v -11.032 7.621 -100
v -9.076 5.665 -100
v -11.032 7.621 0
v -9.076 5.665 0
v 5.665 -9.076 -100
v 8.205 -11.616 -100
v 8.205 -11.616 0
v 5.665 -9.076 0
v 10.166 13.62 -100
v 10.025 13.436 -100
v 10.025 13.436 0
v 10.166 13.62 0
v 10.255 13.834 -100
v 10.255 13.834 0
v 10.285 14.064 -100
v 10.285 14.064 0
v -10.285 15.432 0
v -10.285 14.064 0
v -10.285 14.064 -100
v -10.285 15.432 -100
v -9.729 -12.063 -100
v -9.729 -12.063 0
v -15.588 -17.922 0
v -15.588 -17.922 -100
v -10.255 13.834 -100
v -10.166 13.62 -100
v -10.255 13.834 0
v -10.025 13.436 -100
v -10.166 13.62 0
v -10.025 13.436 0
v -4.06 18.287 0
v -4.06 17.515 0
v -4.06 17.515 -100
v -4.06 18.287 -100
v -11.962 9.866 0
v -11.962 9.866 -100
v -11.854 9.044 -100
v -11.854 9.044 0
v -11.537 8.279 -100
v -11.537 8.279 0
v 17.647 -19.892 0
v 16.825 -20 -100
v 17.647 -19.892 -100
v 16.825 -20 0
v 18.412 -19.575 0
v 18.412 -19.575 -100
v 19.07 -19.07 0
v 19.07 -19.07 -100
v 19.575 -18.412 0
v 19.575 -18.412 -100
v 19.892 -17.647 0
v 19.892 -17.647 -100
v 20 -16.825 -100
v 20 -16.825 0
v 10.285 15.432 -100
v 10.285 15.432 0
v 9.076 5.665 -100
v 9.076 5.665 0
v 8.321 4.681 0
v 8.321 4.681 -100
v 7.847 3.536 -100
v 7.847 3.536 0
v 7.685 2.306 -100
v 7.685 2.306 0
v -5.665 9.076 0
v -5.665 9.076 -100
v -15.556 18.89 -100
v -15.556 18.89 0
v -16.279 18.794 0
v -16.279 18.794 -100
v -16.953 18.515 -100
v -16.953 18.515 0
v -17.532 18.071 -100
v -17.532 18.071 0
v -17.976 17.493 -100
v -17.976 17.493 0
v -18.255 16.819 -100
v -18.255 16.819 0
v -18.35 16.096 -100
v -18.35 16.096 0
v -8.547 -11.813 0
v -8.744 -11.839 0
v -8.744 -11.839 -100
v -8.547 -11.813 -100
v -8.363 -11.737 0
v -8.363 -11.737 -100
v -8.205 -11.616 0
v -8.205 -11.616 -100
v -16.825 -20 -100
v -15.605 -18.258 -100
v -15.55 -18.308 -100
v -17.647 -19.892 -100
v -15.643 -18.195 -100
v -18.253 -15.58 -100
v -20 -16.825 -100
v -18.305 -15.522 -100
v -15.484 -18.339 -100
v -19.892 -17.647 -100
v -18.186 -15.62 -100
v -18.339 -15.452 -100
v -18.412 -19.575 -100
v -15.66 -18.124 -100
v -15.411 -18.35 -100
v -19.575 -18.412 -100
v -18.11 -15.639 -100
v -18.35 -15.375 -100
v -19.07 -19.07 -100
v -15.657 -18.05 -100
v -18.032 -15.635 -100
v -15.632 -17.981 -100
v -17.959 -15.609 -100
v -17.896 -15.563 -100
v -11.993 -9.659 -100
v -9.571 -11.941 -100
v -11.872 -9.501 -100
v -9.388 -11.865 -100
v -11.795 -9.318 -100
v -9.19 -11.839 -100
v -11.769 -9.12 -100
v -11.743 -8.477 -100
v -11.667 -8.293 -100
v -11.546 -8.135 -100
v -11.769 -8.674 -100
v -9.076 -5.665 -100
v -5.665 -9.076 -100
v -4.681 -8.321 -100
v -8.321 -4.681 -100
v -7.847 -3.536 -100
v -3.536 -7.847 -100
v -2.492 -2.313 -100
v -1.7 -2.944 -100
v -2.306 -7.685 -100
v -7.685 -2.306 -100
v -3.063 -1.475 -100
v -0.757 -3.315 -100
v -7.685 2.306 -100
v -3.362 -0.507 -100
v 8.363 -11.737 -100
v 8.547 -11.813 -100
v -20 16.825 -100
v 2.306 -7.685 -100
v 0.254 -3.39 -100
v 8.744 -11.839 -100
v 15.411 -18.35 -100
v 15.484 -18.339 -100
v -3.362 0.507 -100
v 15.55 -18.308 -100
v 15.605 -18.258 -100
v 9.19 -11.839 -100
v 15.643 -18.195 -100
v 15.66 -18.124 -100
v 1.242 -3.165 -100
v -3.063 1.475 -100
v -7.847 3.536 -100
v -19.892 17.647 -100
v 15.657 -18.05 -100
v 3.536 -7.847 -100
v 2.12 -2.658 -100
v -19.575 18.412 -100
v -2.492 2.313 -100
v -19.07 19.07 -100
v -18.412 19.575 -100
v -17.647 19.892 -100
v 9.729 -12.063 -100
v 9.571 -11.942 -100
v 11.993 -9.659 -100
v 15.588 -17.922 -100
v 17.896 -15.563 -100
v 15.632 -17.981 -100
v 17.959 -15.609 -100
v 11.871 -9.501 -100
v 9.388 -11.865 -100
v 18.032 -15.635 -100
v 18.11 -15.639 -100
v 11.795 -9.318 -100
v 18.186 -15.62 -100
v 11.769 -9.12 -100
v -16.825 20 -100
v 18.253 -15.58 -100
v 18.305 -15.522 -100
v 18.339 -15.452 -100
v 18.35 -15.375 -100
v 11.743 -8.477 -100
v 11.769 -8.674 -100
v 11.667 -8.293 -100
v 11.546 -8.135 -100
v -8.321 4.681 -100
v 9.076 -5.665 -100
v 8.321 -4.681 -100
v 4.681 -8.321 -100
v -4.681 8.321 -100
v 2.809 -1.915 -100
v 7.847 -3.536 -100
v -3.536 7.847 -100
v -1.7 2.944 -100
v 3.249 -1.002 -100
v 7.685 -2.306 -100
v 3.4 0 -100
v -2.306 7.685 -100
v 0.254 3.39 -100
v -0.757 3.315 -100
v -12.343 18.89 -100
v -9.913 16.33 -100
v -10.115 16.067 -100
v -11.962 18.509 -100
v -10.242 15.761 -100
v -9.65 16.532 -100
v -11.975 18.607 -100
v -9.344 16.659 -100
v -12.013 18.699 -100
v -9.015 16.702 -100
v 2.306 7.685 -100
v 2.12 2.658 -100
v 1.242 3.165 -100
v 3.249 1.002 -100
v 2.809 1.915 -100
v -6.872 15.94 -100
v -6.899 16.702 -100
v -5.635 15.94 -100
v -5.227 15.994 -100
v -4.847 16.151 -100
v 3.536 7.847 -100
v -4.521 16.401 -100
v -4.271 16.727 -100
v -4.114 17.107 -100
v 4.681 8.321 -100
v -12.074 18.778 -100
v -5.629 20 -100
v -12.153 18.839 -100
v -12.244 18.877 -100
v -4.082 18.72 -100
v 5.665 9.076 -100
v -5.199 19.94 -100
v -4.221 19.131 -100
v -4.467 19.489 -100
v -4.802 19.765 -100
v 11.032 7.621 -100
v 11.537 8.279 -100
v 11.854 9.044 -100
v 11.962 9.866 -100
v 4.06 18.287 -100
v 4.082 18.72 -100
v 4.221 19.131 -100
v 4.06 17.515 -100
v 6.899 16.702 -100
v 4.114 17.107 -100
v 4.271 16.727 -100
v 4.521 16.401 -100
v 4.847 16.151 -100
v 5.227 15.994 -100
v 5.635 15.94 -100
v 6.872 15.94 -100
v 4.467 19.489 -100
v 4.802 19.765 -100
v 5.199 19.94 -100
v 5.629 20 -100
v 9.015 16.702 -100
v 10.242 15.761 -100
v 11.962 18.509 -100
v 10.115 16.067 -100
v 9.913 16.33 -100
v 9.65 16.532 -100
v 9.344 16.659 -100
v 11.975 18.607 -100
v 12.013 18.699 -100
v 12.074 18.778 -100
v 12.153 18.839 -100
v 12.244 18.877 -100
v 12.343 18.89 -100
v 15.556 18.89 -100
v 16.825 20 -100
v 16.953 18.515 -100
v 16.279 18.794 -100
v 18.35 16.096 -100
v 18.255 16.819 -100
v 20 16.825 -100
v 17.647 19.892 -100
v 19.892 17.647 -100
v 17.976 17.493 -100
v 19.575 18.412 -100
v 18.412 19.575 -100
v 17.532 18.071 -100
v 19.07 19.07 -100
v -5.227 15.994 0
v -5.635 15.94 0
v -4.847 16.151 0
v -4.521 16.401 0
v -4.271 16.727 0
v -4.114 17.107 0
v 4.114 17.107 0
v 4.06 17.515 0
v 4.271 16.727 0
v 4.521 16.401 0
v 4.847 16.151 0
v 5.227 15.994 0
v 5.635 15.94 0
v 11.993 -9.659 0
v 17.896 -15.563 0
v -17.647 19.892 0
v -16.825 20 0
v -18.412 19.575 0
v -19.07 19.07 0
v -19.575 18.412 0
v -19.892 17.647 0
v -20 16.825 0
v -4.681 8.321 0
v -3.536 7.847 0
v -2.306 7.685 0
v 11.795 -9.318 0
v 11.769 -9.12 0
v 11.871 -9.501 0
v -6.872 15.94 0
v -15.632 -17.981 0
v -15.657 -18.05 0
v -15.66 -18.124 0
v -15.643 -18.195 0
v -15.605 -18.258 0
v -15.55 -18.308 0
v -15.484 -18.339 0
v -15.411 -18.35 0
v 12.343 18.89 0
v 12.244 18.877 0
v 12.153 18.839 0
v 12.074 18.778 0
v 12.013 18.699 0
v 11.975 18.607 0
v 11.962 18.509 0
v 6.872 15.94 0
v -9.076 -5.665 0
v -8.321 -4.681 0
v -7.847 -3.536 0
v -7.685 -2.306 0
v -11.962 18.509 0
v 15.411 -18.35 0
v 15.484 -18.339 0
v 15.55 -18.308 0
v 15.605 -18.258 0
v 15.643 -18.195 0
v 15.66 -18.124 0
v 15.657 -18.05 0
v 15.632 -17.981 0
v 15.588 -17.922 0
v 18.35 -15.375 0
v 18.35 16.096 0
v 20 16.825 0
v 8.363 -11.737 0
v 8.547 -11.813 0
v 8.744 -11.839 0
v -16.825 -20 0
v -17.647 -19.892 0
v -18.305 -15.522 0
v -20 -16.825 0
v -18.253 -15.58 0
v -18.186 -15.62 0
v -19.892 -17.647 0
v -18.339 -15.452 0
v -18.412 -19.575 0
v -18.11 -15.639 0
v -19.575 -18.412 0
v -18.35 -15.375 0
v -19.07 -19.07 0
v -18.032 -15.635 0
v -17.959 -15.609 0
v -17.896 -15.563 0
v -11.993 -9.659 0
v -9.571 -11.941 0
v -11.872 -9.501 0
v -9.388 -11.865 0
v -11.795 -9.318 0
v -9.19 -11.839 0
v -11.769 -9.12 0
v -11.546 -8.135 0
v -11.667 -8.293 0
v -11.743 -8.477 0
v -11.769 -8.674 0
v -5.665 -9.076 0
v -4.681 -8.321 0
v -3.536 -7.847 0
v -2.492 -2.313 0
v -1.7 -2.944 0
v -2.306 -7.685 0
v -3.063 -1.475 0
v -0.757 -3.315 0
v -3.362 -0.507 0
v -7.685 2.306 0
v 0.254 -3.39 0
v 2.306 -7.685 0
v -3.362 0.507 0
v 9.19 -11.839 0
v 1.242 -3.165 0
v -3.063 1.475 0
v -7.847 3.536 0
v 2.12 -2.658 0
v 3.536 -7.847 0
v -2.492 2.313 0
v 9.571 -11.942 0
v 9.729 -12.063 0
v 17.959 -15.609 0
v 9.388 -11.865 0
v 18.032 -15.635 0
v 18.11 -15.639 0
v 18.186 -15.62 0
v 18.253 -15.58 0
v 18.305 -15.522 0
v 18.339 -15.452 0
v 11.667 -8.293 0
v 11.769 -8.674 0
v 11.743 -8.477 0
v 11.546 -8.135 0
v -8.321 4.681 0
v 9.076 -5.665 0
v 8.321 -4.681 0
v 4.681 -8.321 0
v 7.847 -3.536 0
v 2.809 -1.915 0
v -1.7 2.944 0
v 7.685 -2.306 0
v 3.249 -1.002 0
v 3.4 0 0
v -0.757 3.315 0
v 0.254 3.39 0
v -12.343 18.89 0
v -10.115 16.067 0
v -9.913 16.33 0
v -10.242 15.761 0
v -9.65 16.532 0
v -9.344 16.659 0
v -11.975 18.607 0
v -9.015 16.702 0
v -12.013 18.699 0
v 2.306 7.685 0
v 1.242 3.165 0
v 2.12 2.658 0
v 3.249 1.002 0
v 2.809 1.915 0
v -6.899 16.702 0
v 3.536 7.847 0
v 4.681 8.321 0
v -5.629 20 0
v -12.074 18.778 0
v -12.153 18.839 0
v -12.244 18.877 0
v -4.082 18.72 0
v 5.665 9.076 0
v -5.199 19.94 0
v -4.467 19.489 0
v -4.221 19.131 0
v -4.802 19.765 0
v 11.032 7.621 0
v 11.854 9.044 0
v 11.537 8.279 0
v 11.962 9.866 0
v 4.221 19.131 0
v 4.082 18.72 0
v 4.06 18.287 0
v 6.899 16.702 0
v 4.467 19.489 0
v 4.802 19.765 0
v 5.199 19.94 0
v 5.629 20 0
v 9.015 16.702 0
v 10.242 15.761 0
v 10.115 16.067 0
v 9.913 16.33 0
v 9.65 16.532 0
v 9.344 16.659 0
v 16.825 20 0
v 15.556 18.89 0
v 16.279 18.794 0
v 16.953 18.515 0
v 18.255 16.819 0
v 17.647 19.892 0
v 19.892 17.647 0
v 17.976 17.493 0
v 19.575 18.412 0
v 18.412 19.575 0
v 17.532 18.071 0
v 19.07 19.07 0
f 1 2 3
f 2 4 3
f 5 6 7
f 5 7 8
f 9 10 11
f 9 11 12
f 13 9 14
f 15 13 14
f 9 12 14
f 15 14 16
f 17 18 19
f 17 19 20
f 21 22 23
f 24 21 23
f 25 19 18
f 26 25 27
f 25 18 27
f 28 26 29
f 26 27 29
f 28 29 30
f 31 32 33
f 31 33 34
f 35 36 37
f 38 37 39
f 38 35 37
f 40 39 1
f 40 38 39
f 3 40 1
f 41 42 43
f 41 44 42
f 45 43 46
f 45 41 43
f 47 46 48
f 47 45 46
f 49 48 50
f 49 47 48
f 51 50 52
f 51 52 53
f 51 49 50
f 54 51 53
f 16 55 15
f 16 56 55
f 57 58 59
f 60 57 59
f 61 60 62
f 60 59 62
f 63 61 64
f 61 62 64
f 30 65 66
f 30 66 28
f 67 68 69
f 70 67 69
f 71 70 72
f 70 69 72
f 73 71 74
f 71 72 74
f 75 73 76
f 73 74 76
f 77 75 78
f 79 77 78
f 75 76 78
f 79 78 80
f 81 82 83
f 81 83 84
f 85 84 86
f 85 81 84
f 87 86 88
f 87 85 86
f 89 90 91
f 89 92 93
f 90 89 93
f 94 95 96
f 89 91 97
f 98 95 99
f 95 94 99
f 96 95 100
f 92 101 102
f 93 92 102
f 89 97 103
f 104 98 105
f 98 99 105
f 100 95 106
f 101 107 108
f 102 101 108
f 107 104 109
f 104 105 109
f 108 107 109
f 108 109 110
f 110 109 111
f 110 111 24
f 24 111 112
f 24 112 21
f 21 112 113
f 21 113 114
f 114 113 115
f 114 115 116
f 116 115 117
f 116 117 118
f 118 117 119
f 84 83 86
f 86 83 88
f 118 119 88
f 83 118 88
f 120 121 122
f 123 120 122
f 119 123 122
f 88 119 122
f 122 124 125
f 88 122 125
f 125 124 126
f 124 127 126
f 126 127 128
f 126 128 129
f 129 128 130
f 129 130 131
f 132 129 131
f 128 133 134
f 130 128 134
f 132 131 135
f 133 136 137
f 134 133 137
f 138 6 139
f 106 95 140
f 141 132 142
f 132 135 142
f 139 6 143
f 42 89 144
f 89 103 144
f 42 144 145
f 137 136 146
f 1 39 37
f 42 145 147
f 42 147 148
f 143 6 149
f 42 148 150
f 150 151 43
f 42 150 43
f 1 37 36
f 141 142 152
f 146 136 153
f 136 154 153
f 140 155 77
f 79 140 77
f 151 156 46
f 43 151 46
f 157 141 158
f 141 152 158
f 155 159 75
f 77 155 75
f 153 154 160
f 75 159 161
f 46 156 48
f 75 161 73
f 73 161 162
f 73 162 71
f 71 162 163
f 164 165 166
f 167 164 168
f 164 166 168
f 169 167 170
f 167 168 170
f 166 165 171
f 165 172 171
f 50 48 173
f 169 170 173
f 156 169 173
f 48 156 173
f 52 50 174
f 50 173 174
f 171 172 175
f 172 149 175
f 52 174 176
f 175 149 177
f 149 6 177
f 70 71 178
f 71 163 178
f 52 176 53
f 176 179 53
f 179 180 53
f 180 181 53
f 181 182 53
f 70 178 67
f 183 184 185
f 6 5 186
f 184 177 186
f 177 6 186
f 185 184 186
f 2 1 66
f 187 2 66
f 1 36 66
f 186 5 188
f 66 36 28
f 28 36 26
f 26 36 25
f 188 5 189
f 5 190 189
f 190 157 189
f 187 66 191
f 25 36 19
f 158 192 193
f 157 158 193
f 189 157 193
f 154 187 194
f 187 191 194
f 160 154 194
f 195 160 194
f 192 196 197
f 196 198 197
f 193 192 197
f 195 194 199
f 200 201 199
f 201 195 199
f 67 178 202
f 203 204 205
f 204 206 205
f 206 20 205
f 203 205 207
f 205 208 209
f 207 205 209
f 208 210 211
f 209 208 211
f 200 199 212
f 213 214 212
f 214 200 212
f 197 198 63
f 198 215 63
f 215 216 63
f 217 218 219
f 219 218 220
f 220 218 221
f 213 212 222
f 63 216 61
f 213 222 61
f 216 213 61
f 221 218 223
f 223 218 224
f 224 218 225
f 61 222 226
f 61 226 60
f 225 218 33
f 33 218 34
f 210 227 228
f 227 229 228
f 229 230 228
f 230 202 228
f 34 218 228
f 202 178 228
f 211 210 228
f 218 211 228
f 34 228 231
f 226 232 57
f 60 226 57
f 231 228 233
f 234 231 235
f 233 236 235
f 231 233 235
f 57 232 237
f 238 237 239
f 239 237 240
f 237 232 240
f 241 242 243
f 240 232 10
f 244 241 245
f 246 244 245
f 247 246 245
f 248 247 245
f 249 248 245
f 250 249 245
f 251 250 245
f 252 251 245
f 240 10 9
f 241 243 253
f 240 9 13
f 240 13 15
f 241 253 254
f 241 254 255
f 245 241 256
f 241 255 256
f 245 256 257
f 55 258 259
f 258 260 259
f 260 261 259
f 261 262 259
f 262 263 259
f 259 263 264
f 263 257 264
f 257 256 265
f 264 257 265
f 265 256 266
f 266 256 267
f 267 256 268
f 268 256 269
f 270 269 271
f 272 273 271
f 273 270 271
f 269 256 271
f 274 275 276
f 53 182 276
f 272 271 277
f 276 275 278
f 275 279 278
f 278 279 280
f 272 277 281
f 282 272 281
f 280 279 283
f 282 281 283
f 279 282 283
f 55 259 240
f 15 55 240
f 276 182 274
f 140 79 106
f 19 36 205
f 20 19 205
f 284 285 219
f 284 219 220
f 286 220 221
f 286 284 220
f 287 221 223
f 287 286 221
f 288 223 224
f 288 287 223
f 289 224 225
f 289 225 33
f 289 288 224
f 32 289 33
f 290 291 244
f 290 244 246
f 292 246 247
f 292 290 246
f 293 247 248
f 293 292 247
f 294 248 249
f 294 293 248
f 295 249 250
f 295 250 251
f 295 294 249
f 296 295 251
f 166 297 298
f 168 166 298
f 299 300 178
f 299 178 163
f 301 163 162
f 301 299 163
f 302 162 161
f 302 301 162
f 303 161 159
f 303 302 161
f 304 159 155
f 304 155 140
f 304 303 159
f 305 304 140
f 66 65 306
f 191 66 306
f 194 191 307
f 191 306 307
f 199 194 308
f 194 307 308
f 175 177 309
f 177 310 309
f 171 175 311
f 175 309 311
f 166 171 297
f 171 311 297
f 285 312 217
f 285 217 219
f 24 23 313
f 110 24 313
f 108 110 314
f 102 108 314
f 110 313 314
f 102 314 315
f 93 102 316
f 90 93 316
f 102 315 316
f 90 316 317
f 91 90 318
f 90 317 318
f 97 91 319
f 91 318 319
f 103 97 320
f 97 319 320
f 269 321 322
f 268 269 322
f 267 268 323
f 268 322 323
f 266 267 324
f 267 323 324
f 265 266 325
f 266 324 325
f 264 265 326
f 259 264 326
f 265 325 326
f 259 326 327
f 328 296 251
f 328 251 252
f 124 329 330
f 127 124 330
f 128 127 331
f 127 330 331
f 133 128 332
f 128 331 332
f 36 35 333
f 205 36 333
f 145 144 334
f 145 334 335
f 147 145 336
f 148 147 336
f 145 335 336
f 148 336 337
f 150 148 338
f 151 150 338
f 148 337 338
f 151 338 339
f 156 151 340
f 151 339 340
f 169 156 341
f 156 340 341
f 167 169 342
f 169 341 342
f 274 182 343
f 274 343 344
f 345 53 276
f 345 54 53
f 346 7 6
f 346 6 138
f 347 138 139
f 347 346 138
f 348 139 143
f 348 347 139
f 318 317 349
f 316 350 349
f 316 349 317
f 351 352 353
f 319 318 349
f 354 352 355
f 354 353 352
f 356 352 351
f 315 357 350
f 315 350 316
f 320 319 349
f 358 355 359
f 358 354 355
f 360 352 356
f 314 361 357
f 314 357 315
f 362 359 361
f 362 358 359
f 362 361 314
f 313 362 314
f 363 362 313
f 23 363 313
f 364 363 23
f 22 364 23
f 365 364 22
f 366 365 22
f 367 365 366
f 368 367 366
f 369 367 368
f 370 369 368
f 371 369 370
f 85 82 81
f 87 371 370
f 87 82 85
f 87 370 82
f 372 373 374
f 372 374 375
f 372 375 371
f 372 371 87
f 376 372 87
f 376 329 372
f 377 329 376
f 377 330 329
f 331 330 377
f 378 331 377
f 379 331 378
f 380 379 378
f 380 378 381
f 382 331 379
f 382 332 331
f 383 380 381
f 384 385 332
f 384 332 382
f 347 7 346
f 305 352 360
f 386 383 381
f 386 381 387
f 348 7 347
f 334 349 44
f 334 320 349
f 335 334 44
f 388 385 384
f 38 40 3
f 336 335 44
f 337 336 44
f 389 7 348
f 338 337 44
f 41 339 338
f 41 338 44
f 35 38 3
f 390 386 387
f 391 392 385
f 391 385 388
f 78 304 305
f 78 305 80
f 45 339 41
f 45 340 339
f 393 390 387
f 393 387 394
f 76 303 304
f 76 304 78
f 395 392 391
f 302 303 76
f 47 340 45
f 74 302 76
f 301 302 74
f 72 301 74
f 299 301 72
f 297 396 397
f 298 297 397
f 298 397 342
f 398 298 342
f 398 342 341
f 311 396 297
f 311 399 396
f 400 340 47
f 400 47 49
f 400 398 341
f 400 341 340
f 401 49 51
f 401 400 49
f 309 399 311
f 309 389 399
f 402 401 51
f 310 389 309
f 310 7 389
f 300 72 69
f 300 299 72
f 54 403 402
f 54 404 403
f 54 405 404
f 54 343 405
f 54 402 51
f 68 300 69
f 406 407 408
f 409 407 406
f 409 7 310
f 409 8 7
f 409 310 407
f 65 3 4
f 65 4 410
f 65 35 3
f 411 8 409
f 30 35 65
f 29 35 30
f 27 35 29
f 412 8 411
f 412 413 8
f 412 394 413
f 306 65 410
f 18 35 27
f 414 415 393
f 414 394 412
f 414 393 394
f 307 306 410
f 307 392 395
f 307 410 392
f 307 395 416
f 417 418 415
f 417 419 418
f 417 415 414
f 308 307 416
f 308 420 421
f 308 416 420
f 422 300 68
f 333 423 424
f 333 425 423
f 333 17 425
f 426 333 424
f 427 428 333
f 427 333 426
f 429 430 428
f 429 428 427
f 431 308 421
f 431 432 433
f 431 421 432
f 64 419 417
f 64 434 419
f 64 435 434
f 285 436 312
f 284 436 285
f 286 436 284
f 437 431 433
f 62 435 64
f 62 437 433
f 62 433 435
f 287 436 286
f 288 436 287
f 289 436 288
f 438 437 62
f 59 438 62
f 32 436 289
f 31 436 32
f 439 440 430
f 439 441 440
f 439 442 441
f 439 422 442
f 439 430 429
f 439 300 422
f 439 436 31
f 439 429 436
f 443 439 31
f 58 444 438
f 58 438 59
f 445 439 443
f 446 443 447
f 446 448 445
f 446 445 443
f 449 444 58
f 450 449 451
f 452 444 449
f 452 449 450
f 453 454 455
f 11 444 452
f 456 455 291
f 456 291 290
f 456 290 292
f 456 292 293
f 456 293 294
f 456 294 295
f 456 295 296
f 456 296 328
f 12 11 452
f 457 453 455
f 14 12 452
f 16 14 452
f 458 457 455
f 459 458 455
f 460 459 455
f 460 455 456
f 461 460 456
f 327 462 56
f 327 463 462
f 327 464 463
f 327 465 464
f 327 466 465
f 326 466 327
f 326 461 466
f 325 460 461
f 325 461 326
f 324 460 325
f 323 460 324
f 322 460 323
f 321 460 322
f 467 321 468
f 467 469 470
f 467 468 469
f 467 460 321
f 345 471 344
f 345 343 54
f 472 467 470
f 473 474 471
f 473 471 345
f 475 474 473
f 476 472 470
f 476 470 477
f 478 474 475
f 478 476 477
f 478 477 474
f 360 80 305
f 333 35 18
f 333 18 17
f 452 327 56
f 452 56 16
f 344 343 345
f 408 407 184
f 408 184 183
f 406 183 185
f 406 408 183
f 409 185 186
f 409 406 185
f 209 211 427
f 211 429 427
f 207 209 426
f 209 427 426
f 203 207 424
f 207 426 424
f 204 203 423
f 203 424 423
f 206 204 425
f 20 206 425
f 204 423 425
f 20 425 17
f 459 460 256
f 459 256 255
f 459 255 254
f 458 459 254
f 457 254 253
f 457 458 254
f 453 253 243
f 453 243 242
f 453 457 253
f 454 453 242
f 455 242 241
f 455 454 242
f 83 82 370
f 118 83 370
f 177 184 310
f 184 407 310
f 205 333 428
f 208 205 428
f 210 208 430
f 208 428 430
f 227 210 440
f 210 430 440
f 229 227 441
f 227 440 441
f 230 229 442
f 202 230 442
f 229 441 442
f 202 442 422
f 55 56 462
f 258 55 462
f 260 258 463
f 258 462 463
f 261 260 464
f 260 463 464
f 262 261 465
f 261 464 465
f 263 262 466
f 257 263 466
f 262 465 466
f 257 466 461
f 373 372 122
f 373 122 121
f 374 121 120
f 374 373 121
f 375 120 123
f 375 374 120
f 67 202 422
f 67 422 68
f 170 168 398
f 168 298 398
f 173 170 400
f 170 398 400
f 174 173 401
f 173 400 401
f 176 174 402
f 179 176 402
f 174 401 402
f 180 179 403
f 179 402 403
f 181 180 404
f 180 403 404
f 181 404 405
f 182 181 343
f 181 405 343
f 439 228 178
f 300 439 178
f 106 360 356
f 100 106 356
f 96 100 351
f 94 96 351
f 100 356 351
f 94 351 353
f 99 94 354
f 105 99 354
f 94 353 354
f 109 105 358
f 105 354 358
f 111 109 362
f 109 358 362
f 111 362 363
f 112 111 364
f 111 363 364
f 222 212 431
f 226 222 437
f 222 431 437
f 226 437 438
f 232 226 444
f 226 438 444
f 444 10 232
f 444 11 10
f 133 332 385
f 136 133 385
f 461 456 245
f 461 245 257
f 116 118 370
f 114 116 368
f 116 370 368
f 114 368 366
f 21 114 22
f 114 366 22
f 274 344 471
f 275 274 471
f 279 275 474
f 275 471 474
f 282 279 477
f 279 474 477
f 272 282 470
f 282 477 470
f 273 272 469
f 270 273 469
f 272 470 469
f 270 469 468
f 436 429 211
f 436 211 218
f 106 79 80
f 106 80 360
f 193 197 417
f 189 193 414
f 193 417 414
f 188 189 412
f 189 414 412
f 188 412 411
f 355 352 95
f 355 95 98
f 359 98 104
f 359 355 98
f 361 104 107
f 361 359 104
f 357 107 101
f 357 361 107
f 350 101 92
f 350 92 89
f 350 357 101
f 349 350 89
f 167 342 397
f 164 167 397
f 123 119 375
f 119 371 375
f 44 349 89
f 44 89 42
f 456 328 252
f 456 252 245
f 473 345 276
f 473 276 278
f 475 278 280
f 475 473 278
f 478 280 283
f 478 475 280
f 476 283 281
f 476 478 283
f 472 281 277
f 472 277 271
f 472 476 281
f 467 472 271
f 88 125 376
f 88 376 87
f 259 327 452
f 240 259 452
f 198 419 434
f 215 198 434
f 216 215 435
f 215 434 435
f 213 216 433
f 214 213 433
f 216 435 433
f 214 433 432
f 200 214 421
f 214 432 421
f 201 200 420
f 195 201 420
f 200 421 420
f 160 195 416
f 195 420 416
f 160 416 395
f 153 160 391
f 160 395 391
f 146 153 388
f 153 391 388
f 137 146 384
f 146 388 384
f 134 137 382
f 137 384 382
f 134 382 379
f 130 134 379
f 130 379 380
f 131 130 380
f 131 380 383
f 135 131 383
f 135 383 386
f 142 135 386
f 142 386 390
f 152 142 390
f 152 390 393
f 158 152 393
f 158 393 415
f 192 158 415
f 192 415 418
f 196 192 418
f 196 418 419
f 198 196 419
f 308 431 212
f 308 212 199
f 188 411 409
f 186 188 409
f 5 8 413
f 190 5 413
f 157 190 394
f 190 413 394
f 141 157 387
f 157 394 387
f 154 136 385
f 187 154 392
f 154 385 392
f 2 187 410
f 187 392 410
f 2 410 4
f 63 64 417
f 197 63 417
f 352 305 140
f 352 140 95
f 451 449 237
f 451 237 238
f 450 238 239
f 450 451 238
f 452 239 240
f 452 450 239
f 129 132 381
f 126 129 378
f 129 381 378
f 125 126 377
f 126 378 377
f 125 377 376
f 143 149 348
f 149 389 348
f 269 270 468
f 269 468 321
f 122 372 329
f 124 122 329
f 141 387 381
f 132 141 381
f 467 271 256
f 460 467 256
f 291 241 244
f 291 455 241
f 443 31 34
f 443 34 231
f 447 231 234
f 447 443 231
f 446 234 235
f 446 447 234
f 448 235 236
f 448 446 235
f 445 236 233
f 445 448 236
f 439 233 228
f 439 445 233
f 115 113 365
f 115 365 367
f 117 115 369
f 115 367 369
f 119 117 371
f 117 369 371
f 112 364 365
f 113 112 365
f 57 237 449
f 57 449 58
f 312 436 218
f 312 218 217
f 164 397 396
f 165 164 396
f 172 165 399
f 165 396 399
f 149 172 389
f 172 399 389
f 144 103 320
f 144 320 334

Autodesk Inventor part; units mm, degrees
ref_plane "YZ Plane" through (0, 0, 0) normal (1, 0, 0) x (0, 1, 0)
ref_plane "XZ Plane" through (0, 0, 0) normal (0, 1, 0) x (-1, 0, 0)
ref_plane "XY Plane" through (0, 0, 0) normal (0, 0, 1) x (1, 0, 0)
sketch "Sketch1" plane through (0, 0, 0) normal (0, 0, 1) x (1, 0, 0)
  circle A0 centre (0, 0) radius 3.4
  arc A1 (15.4108, -18.35) -> (15.5882, -17.9217) centre (15.4108, -18.0991) ccw
  line L0 (-15.4108, -18.35) -> (15.4108, -18.35)
  arc A2 (-15.5882, -17.9217) -> (-15.4108, -18.35) centre (-15.4108, -18.0991) ccw
  line L1 (-9.7291, -12.0626) -> (-15.5882, -17.9217)
  arc A3 (-9.1903, -11.8394) -> (-9.7291, -12.0626) centre (-9.1903, -12.6014) ccw
  line L2 (-8.7439, -11.8394) -> (-9.1903, -11.8394)
  arc A4 (-8.7439, -11.8394) -> (-8.2051, -11.6162) centre (-8.7439, -11.0774) ccw
  line L3 (-5.6651, -9.0762) -> (-8.2051, -11.6162)
  arc A5 (-2.3065, -7.685) -> (-5.6651, -9.0762) centre (-2.3065, -12.4348) ccw
  line L4 (2.3065, -7.685) -> (-2.3065, -7.685)
  arc A6 (5.6651, -9.0762) -> (2.3065, -7.685) centre (2.3065, -12.4348) ccw
  line L5 (8.2051, -11.6162) -> (5.6651, -9.0762)
  arc A7 (8.2051, -11.6162) -> (8.7439, -11.8394) centre (8.7439, -11.0774) ccw
  line L6 (9.1903, -11.8394) -> (8.7439, -11.8394)
  arc A8 (9.7291, -12.0626) -> (9.1903, -11.8394) centre (9.1903, -12.6014) ccw
  line L7 (15.5882, -17.9217) -> (9.7291, -12.0626)
  arc A9 (11.7694, -8.6739) -> (11.5462, -8.1351) centre (11.0074, -8.6739) ccw
  line L8 (9.0762, -5.6651) -> (11.5462, -8.1351)
  arc A10 (7.685, -2.3065) -> (9.0762, -5.6651) centre (12.4348, -2.3065) ccw
  line L9 (7.685, 2.3065) -> (7.685, -2.3065)
  arc A11 (9.0762, 5.6651) -> (7.685, 2.3065) centre (12.4348, 2.3065) ccw
  line L10 (11.0322, 7.6211) -> (9.0762, 5.6651)
  arc A12 (11.0322, 7.6211) -> (11.9621, 9.8662) centre (8.7871, 9.8662) ccw
  line L11 (11.9621, 18.5086) -> (11.9621, 9.8662)
  arc A13 (12.3431, 18.8896) -> (11.9621, 18.5086) centre (12.3431, 18.5086) ccw
  line L12 (15.556, 18.8896) -> (12.3431, 18.8896)
  arc A14 (18.35, 16.0956) -> (15.556, 18.8896) centre (15.556, 16.0956) ccw
  line L13 (18.35, -15.3747) -> (18.35, 16.0956)
  arc A15 (17.8962, -15.5627) -> (18.35, -15.3747) centre (18.0841, -15.3747) ccw
  line L14 (11.9926, -9.6591) -> (17.8962, -15.5627)
  arc A16 (11.7694, -9.1203) -> (11.9926, -9.6591) centre (12.5314, -9.1203) ccw
  line L15 (11.7694, -8.6739) -> (11.7694, -9.1203)
  arc A17 (-9.0762, -5.6651) -> (-7.685, -2.3065) centre (-12.4348, -2.3065) ccw
  line L16 (-11.5462, -8.1351) -> (-9.0762, -5.6651)
  arc A18 (-11.5462, -8.1351) -> (-11.7694, -8.6739) centre (-11.0074, -8.6739) ccw
  line L17 (-11.7694, -9.1203) -> (-11.7694, -8.6739)
  arc A19 (-11.9926, -9.6591) -> (-11.7694, -9.1203) centre (-12.5314, -9.1203) ccw
  line L18 (-17.8962, -15.5627) -> (-11.9926, -9.6591)
  arc A20 (-18.35, -15.3747) -> (-17.8962, -15.5627) centre (-18.0841, -15.3747) ccw
  line L19 (-18.35, 16.0956) -> (-18.35, -15.3747)
  arc A21 (-15.556, 18.8896) -> (-18.35, 16.0956) centre (-15.556, 16.0956) ccw
  line L20 (-12.3431, 18.8896) -> (-15.556, 18.8896)
  arc A22 (-11.9621, 18.5086) -> (-12.3431, 18.8896) centre (-12.3431, 18.5086) ccw
  line L21 (-11.9621, 9.8662) -> (-11.9621, 18.5086)
  arc A23 (-11.9621, 9.8662) -> (-11.0322, 7.6211) centre (-8.7871, 9.8662) ccw
  line L22 (-9.0762, 5.6651) -> (-11.0322, 7.6211)
  arc A24 (-7.685, 2.3065) -> (-9.0762, 5.6651) centre (-12.4348, 2.3065) ccw
  line L23 (-7.685, -2.3065) -> (-7.685, 2.3065)
  arc A25 (20, 16.825) -> (16.825, 20) centre (16.825, 16.825) ccw
  line L24 (16.825, 20) -> (5.6287, 20)
  arc A26 (5.6287, 20) -> (4.06, 18.2867) centre (5.6287, 18.4252) ccw
  line L25 (4.06, 18.2867) -> (4.06, 17.5148)
  arc A27 (4.06, 17.5148) -> (5.6348, 15.94) centre (5.6348, 17.5148) ccw
  line L26 (5.6348, 15.94) -> (6.8724, 15.94)
  line L27 (6.8724, 15.94) -> (6.899, 16.702)
  line L28 (6.899, 16.702) -> (9.015, 16.702)
  arc A28 (10.285, 15.432) -> (9.015, 16.702) centre (9.015, 15.432) ccw
  line L29 (10.285, 15.432) -> (10.285, 14.0643)
  arc A29 (10.0246, 13.4357) -> (10.285, 14.0643) centre (9.396, 14.0643) ccw
  line L30 (10.0246, 13.4357) -> (5.6651, 9.0762)
  arc A30 (2.3065, 7.685) -> (5.6651, 9.0762) centre (2.3065, 12.4348) ccw
  line L31 (2.3065, 7.685) -> (-2.3065, 7.685)
  arc A31 (-5.6651, 9.0762) -> (-2.3065, 7.685) centre (-2.3065, 12.4348) ccw
  line L32 (-5.6651, 9.0762) -> (-10.0246, 13.4357)
  arc A32 (-10.285, 14.0643) -> (-10.0246, 13.4357) centre (-9.396, 14.0643) ccw
  line L33 (-10.285, 14.0643) -> (-10.285, 15.432)
  arc A33 (-9.015, 16.702) -> (-10.285, 15.432) centre (-9.015, 15.432) ccw
  line L34 (-9.015, 16.702) -> (-6.899, 16.702)
  line L35 (-6.899, 16.702) -> (-6.8724, 15.94)
  line L36 (-6.8724, 15.94) -> (-5.6348, 15.94)
  arc A34 (-5.6348, 15.94) -> (-4.06, 17.5148) centre (-5.6348, 17.5148) ccw
  line L37 (-4.06, 17.5148) -> (-4.06, 18.2867)
  arc A35 (-4.06, 18.2867) -> (-5.6287, 20) centre (-5.6287, 18.4252) ccw
  line L38 (-5.6287, 20) -> (-16.825, 20)
  arc A36 (-16.825, 20) -> (-20, 16.825) centre (-16.825, 16.825) ccw
  line L39 (-20, 16.825) -> (-20, -16.825)
  arc A37 (-20, -16.825) -> (-16.825, -20) centre (-16.825, -16.825) ccw
  line L40 (-16.825, -20) -> (16.825, -20)
  arc A38 (16.825, -20) -> (20, -16.825) centre (16.825, -16.825) ccw
  line L41 (20, -16.825) -> (20, 16.825)
extrude "Extrusion1" add sketch "Sketch1" against normal blind 100
properties part number "40-4001-BLACK-FB"
